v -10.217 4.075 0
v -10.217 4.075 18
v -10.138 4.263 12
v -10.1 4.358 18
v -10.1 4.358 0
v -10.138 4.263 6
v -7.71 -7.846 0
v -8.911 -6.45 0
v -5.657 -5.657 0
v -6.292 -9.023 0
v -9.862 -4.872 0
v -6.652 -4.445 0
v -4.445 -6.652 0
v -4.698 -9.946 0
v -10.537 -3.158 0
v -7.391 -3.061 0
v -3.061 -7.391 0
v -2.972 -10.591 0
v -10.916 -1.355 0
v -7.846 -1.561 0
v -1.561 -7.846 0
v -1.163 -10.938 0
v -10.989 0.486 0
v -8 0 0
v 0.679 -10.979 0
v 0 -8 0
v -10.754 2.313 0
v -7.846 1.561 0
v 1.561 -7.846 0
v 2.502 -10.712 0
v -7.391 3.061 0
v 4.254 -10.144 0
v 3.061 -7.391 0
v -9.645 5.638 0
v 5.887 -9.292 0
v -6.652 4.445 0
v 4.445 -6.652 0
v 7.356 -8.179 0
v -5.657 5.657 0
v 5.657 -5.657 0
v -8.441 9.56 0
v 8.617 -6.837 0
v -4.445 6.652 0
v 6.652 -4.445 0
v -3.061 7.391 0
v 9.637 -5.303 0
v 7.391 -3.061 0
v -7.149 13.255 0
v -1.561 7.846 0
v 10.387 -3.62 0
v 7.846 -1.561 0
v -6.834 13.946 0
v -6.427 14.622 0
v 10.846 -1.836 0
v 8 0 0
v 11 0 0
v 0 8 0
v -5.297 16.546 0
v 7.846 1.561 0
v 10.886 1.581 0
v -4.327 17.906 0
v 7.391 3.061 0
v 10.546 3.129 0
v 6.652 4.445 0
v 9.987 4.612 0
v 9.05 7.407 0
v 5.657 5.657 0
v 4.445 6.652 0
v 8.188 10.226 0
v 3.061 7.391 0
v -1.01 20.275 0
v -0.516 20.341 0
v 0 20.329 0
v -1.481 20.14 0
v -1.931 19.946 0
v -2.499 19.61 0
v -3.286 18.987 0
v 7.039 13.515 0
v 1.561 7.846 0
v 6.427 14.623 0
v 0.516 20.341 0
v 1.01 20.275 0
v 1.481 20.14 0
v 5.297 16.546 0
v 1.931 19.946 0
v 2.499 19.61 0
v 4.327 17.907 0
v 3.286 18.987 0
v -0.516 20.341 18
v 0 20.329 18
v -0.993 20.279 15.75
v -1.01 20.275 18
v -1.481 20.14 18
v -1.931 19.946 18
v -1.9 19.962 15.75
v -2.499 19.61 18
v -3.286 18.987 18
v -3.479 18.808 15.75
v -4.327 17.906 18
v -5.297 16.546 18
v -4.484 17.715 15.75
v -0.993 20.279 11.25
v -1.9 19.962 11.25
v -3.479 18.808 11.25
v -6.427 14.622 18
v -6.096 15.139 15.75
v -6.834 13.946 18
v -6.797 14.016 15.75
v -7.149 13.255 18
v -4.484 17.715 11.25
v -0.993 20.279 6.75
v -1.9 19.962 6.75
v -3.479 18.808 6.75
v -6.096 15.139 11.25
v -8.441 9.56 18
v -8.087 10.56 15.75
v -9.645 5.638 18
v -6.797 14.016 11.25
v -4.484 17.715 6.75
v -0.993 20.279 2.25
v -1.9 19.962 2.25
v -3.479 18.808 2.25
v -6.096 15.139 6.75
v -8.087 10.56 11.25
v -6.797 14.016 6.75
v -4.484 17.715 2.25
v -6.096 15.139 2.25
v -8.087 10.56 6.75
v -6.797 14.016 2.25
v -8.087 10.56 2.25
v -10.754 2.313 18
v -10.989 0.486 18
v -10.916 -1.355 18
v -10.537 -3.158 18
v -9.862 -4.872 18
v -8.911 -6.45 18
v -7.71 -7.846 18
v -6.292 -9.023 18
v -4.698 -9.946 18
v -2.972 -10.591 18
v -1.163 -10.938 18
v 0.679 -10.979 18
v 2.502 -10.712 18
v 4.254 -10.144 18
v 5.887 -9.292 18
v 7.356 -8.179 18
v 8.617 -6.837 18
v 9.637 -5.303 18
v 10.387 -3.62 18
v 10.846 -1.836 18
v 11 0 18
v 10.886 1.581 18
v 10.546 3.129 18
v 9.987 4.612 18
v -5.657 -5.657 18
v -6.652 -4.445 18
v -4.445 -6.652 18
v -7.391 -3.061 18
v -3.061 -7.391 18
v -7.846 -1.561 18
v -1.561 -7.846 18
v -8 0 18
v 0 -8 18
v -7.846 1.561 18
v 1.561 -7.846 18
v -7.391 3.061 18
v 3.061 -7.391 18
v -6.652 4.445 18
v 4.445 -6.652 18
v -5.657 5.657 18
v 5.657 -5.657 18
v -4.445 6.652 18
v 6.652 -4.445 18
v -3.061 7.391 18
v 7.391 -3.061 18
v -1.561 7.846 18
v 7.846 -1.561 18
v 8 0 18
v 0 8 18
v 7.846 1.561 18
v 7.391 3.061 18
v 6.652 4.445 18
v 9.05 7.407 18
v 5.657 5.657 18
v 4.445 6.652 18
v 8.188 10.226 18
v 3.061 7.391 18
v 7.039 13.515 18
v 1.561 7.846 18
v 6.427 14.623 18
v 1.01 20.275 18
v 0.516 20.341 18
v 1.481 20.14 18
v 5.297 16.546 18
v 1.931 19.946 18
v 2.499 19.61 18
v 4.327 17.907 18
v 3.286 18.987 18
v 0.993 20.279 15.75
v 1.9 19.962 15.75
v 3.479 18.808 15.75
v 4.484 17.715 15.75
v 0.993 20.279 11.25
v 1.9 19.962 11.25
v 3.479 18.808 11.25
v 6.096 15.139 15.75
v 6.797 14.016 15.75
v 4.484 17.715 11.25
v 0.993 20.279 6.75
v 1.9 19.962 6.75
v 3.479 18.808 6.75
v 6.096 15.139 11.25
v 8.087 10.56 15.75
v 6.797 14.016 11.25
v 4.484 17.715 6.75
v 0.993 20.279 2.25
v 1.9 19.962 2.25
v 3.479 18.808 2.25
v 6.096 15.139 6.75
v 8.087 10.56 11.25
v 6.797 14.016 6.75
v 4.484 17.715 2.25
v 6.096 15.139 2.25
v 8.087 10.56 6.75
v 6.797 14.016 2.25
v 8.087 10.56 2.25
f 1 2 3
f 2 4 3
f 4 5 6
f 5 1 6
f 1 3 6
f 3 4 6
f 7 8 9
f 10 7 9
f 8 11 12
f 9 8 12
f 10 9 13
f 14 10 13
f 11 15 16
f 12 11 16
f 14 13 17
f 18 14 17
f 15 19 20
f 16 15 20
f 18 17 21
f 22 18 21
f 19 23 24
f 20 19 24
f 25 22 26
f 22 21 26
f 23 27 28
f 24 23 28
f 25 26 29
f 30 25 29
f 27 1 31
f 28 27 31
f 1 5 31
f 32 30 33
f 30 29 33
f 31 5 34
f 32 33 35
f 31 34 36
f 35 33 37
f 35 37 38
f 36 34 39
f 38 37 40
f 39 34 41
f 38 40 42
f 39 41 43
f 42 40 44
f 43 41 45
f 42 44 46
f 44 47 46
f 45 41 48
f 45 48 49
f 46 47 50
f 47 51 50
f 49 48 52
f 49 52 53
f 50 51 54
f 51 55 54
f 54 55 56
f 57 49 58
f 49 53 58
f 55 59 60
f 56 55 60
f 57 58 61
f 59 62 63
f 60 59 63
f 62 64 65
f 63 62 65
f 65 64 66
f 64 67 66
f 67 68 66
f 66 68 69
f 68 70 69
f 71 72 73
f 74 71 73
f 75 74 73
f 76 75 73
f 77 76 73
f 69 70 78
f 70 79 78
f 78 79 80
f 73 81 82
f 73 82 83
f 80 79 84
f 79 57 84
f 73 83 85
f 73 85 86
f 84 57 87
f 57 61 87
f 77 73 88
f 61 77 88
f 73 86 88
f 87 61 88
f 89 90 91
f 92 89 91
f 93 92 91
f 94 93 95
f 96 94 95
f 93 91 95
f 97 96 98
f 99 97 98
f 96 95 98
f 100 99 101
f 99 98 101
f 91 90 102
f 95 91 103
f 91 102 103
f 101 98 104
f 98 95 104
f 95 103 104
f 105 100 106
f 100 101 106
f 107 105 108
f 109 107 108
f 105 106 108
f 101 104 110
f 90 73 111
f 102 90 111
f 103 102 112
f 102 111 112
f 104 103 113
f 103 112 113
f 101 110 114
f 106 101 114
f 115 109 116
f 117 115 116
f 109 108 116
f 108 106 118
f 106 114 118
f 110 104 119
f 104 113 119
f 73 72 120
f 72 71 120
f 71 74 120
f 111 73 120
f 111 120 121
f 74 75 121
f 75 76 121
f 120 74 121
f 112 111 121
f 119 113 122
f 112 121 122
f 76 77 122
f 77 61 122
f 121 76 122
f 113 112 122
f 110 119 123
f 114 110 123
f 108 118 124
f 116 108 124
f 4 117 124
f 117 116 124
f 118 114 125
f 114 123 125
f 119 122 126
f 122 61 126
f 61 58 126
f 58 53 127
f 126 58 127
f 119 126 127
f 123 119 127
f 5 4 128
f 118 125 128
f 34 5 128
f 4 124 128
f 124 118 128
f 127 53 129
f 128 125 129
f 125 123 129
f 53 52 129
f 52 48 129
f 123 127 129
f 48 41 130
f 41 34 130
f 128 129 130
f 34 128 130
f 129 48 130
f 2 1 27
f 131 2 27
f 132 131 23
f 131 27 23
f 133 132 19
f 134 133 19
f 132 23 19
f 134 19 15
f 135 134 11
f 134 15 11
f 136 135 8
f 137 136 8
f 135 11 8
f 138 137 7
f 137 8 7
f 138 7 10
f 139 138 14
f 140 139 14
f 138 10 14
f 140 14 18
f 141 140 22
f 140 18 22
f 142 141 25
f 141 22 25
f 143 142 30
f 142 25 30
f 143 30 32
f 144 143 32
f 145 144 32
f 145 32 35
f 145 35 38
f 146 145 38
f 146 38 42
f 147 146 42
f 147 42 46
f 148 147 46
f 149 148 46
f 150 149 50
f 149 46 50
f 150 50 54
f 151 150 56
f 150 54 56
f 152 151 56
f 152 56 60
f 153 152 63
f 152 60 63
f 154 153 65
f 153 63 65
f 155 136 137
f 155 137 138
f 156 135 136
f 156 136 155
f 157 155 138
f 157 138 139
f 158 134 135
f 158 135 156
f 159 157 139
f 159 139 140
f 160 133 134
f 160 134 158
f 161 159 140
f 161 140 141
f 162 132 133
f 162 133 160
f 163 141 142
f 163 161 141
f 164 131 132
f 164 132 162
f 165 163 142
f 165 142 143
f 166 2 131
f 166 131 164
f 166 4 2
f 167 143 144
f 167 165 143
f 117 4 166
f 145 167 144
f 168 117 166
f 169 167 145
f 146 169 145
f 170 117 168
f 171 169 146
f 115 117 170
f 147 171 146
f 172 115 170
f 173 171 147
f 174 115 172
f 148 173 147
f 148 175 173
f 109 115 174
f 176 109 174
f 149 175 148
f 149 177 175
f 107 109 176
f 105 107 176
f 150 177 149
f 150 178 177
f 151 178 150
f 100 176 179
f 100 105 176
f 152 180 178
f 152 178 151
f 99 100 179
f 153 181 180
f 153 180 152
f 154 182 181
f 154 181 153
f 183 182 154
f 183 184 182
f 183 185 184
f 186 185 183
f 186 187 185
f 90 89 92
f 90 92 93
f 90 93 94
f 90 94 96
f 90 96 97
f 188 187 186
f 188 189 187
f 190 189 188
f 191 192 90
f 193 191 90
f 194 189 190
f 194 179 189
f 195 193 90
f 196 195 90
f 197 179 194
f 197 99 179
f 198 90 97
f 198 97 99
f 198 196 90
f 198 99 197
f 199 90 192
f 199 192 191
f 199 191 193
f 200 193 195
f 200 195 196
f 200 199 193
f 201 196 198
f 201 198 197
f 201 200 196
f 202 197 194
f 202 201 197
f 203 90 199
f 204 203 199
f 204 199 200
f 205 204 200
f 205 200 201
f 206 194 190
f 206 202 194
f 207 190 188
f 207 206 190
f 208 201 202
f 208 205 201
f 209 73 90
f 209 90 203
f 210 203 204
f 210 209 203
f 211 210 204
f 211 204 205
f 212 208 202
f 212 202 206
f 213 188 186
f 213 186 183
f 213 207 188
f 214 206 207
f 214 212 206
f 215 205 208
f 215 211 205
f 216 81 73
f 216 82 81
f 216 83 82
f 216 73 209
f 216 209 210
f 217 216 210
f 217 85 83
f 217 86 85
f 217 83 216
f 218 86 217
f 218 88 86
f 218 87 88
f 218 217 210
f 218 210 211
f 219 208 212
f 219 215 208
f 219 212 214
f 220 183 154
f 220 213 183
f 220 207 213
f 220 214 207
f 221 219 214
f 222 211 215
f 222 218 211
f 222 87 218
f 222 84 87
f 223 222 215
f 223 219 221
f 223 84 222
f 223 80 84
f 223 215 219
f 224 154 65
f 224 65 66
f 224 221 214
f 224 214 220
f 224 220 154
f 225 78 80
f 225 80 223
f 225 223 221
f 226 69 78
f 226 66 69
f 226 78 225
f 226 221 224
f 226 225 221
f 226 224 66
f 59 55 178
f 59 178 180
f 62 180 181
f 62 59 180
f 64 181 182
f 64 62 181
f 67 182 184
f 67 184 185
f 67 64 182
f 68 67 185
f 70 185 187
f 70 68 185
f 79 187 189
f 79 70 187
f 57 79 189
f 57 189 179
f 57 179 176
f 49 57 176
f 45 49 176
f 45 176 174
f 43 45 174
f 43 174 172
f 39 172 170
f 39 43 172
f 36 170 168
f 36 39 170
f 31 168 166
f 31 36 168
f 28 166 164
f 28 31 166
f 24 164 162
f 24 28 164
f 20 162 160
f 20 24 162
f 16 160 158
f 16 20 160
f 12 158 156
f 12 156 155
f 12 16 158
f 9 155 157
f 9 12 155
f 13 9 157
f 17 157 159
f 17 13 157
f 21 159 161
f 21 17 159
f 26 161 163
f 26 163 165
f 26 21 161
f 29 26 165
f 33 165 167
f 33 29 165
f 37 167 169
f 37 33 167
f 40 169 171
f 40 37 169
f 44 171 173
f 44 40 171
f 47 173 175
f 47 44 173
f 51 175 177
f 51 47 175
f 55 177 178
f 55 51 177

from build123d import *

# Parameters (mm, degrees)
SKETCH_1_R      = 8
EXTRUDE_1_DEPTH = 18


with BuildPart() as part:
    # Эскиз1 → Бобышка-Вытянуть1 (new body)
    # profile 1 of 2: a face of its own
    with BuildSketch(Plane.XY):
        with BuildLine():
            ThreePointArc((-10.100042175, 4.357653964), (-0.139043679, 10.999121186), (9.986659039, 4.611576872))
            add(Edge.make_bspline(
                [(0, 20.328552603), (1.382874881, 20.471678841), (3.387437685, 19.140957741), (5.149203969, 16.937361824), (6.019843488, 15.189591781), (6.94726478, 13.901122152), (7.481940513, 12.301028666), (8.123645702, 10.548388164), (8.7922779, 7.928692427), (9.588098387, 5.99820489), (9.986659039, 4.611576872)],
                knots=[0, 0, 0, 0, 0.197957329, 0.347933103, 0.427687734, 0.494984692, 0.588497983, 0.682566948, 0.780100182, 1, 1, 1, 1], degree=3))
            add(Edge.make_bspline(
                [(0, 20.328552603), (-1.382825366, 20.471663096), (-3.387593877, 19.141007408), (-5.148912185, 16.937269039), (-6.020348908, 15.189752499), (-6.94541903, 13.900535223), (-7.491989169, 12.304224029), (-8.089155155, 10.526036811), (-9.05396332, 7.903603604), (-9.530122855, 5.775128018), (-10.100042175, 4.357653964)],
                knots=[0, 0, 0, 0, 0.192274789, 0.337945376, 0.41541058, 0.48077572, 0.571604629, 0.662973262, 0.759317857, 0.984960565, 0.984960565, 0.984960565, 0.984960565], degree=3))
        make_face()
    # profile 2 of 2: a face of its own
    with BuildSketch(Plane.XY):
        with BuildLine():
            ThreePointArc((-10.217258553, 4.075245718), (-2.074868178, -10.802542388), (11, 0))
            ThreePointArc((11, 0), (10.74367836, 2.360799714), (9.986659039, 4.611576872))
            ThreePointArc((9.986659039, 4.611576872), (-0.139043679, 10.999121186), (-10.100042175, 4.357653964))
            add(Edge.make_bspline(
                [(-10.100042175, 4.357653964), (-10.138028177, 4.26317713), (-10.177063639, 4.169029578), (-10.217258553, 4.075245718)],
                knots=[0.984960565, 0.984960565, 0.984960565, 0.984960565, 1, 1, 1, 1], degree=3))
        make_face()
        Circle(SKETCH_1_R, mode=Mode.SUBTRACT)
    extrude(amount=EXTRUDE_1_DEPTH)


solid = part.part
